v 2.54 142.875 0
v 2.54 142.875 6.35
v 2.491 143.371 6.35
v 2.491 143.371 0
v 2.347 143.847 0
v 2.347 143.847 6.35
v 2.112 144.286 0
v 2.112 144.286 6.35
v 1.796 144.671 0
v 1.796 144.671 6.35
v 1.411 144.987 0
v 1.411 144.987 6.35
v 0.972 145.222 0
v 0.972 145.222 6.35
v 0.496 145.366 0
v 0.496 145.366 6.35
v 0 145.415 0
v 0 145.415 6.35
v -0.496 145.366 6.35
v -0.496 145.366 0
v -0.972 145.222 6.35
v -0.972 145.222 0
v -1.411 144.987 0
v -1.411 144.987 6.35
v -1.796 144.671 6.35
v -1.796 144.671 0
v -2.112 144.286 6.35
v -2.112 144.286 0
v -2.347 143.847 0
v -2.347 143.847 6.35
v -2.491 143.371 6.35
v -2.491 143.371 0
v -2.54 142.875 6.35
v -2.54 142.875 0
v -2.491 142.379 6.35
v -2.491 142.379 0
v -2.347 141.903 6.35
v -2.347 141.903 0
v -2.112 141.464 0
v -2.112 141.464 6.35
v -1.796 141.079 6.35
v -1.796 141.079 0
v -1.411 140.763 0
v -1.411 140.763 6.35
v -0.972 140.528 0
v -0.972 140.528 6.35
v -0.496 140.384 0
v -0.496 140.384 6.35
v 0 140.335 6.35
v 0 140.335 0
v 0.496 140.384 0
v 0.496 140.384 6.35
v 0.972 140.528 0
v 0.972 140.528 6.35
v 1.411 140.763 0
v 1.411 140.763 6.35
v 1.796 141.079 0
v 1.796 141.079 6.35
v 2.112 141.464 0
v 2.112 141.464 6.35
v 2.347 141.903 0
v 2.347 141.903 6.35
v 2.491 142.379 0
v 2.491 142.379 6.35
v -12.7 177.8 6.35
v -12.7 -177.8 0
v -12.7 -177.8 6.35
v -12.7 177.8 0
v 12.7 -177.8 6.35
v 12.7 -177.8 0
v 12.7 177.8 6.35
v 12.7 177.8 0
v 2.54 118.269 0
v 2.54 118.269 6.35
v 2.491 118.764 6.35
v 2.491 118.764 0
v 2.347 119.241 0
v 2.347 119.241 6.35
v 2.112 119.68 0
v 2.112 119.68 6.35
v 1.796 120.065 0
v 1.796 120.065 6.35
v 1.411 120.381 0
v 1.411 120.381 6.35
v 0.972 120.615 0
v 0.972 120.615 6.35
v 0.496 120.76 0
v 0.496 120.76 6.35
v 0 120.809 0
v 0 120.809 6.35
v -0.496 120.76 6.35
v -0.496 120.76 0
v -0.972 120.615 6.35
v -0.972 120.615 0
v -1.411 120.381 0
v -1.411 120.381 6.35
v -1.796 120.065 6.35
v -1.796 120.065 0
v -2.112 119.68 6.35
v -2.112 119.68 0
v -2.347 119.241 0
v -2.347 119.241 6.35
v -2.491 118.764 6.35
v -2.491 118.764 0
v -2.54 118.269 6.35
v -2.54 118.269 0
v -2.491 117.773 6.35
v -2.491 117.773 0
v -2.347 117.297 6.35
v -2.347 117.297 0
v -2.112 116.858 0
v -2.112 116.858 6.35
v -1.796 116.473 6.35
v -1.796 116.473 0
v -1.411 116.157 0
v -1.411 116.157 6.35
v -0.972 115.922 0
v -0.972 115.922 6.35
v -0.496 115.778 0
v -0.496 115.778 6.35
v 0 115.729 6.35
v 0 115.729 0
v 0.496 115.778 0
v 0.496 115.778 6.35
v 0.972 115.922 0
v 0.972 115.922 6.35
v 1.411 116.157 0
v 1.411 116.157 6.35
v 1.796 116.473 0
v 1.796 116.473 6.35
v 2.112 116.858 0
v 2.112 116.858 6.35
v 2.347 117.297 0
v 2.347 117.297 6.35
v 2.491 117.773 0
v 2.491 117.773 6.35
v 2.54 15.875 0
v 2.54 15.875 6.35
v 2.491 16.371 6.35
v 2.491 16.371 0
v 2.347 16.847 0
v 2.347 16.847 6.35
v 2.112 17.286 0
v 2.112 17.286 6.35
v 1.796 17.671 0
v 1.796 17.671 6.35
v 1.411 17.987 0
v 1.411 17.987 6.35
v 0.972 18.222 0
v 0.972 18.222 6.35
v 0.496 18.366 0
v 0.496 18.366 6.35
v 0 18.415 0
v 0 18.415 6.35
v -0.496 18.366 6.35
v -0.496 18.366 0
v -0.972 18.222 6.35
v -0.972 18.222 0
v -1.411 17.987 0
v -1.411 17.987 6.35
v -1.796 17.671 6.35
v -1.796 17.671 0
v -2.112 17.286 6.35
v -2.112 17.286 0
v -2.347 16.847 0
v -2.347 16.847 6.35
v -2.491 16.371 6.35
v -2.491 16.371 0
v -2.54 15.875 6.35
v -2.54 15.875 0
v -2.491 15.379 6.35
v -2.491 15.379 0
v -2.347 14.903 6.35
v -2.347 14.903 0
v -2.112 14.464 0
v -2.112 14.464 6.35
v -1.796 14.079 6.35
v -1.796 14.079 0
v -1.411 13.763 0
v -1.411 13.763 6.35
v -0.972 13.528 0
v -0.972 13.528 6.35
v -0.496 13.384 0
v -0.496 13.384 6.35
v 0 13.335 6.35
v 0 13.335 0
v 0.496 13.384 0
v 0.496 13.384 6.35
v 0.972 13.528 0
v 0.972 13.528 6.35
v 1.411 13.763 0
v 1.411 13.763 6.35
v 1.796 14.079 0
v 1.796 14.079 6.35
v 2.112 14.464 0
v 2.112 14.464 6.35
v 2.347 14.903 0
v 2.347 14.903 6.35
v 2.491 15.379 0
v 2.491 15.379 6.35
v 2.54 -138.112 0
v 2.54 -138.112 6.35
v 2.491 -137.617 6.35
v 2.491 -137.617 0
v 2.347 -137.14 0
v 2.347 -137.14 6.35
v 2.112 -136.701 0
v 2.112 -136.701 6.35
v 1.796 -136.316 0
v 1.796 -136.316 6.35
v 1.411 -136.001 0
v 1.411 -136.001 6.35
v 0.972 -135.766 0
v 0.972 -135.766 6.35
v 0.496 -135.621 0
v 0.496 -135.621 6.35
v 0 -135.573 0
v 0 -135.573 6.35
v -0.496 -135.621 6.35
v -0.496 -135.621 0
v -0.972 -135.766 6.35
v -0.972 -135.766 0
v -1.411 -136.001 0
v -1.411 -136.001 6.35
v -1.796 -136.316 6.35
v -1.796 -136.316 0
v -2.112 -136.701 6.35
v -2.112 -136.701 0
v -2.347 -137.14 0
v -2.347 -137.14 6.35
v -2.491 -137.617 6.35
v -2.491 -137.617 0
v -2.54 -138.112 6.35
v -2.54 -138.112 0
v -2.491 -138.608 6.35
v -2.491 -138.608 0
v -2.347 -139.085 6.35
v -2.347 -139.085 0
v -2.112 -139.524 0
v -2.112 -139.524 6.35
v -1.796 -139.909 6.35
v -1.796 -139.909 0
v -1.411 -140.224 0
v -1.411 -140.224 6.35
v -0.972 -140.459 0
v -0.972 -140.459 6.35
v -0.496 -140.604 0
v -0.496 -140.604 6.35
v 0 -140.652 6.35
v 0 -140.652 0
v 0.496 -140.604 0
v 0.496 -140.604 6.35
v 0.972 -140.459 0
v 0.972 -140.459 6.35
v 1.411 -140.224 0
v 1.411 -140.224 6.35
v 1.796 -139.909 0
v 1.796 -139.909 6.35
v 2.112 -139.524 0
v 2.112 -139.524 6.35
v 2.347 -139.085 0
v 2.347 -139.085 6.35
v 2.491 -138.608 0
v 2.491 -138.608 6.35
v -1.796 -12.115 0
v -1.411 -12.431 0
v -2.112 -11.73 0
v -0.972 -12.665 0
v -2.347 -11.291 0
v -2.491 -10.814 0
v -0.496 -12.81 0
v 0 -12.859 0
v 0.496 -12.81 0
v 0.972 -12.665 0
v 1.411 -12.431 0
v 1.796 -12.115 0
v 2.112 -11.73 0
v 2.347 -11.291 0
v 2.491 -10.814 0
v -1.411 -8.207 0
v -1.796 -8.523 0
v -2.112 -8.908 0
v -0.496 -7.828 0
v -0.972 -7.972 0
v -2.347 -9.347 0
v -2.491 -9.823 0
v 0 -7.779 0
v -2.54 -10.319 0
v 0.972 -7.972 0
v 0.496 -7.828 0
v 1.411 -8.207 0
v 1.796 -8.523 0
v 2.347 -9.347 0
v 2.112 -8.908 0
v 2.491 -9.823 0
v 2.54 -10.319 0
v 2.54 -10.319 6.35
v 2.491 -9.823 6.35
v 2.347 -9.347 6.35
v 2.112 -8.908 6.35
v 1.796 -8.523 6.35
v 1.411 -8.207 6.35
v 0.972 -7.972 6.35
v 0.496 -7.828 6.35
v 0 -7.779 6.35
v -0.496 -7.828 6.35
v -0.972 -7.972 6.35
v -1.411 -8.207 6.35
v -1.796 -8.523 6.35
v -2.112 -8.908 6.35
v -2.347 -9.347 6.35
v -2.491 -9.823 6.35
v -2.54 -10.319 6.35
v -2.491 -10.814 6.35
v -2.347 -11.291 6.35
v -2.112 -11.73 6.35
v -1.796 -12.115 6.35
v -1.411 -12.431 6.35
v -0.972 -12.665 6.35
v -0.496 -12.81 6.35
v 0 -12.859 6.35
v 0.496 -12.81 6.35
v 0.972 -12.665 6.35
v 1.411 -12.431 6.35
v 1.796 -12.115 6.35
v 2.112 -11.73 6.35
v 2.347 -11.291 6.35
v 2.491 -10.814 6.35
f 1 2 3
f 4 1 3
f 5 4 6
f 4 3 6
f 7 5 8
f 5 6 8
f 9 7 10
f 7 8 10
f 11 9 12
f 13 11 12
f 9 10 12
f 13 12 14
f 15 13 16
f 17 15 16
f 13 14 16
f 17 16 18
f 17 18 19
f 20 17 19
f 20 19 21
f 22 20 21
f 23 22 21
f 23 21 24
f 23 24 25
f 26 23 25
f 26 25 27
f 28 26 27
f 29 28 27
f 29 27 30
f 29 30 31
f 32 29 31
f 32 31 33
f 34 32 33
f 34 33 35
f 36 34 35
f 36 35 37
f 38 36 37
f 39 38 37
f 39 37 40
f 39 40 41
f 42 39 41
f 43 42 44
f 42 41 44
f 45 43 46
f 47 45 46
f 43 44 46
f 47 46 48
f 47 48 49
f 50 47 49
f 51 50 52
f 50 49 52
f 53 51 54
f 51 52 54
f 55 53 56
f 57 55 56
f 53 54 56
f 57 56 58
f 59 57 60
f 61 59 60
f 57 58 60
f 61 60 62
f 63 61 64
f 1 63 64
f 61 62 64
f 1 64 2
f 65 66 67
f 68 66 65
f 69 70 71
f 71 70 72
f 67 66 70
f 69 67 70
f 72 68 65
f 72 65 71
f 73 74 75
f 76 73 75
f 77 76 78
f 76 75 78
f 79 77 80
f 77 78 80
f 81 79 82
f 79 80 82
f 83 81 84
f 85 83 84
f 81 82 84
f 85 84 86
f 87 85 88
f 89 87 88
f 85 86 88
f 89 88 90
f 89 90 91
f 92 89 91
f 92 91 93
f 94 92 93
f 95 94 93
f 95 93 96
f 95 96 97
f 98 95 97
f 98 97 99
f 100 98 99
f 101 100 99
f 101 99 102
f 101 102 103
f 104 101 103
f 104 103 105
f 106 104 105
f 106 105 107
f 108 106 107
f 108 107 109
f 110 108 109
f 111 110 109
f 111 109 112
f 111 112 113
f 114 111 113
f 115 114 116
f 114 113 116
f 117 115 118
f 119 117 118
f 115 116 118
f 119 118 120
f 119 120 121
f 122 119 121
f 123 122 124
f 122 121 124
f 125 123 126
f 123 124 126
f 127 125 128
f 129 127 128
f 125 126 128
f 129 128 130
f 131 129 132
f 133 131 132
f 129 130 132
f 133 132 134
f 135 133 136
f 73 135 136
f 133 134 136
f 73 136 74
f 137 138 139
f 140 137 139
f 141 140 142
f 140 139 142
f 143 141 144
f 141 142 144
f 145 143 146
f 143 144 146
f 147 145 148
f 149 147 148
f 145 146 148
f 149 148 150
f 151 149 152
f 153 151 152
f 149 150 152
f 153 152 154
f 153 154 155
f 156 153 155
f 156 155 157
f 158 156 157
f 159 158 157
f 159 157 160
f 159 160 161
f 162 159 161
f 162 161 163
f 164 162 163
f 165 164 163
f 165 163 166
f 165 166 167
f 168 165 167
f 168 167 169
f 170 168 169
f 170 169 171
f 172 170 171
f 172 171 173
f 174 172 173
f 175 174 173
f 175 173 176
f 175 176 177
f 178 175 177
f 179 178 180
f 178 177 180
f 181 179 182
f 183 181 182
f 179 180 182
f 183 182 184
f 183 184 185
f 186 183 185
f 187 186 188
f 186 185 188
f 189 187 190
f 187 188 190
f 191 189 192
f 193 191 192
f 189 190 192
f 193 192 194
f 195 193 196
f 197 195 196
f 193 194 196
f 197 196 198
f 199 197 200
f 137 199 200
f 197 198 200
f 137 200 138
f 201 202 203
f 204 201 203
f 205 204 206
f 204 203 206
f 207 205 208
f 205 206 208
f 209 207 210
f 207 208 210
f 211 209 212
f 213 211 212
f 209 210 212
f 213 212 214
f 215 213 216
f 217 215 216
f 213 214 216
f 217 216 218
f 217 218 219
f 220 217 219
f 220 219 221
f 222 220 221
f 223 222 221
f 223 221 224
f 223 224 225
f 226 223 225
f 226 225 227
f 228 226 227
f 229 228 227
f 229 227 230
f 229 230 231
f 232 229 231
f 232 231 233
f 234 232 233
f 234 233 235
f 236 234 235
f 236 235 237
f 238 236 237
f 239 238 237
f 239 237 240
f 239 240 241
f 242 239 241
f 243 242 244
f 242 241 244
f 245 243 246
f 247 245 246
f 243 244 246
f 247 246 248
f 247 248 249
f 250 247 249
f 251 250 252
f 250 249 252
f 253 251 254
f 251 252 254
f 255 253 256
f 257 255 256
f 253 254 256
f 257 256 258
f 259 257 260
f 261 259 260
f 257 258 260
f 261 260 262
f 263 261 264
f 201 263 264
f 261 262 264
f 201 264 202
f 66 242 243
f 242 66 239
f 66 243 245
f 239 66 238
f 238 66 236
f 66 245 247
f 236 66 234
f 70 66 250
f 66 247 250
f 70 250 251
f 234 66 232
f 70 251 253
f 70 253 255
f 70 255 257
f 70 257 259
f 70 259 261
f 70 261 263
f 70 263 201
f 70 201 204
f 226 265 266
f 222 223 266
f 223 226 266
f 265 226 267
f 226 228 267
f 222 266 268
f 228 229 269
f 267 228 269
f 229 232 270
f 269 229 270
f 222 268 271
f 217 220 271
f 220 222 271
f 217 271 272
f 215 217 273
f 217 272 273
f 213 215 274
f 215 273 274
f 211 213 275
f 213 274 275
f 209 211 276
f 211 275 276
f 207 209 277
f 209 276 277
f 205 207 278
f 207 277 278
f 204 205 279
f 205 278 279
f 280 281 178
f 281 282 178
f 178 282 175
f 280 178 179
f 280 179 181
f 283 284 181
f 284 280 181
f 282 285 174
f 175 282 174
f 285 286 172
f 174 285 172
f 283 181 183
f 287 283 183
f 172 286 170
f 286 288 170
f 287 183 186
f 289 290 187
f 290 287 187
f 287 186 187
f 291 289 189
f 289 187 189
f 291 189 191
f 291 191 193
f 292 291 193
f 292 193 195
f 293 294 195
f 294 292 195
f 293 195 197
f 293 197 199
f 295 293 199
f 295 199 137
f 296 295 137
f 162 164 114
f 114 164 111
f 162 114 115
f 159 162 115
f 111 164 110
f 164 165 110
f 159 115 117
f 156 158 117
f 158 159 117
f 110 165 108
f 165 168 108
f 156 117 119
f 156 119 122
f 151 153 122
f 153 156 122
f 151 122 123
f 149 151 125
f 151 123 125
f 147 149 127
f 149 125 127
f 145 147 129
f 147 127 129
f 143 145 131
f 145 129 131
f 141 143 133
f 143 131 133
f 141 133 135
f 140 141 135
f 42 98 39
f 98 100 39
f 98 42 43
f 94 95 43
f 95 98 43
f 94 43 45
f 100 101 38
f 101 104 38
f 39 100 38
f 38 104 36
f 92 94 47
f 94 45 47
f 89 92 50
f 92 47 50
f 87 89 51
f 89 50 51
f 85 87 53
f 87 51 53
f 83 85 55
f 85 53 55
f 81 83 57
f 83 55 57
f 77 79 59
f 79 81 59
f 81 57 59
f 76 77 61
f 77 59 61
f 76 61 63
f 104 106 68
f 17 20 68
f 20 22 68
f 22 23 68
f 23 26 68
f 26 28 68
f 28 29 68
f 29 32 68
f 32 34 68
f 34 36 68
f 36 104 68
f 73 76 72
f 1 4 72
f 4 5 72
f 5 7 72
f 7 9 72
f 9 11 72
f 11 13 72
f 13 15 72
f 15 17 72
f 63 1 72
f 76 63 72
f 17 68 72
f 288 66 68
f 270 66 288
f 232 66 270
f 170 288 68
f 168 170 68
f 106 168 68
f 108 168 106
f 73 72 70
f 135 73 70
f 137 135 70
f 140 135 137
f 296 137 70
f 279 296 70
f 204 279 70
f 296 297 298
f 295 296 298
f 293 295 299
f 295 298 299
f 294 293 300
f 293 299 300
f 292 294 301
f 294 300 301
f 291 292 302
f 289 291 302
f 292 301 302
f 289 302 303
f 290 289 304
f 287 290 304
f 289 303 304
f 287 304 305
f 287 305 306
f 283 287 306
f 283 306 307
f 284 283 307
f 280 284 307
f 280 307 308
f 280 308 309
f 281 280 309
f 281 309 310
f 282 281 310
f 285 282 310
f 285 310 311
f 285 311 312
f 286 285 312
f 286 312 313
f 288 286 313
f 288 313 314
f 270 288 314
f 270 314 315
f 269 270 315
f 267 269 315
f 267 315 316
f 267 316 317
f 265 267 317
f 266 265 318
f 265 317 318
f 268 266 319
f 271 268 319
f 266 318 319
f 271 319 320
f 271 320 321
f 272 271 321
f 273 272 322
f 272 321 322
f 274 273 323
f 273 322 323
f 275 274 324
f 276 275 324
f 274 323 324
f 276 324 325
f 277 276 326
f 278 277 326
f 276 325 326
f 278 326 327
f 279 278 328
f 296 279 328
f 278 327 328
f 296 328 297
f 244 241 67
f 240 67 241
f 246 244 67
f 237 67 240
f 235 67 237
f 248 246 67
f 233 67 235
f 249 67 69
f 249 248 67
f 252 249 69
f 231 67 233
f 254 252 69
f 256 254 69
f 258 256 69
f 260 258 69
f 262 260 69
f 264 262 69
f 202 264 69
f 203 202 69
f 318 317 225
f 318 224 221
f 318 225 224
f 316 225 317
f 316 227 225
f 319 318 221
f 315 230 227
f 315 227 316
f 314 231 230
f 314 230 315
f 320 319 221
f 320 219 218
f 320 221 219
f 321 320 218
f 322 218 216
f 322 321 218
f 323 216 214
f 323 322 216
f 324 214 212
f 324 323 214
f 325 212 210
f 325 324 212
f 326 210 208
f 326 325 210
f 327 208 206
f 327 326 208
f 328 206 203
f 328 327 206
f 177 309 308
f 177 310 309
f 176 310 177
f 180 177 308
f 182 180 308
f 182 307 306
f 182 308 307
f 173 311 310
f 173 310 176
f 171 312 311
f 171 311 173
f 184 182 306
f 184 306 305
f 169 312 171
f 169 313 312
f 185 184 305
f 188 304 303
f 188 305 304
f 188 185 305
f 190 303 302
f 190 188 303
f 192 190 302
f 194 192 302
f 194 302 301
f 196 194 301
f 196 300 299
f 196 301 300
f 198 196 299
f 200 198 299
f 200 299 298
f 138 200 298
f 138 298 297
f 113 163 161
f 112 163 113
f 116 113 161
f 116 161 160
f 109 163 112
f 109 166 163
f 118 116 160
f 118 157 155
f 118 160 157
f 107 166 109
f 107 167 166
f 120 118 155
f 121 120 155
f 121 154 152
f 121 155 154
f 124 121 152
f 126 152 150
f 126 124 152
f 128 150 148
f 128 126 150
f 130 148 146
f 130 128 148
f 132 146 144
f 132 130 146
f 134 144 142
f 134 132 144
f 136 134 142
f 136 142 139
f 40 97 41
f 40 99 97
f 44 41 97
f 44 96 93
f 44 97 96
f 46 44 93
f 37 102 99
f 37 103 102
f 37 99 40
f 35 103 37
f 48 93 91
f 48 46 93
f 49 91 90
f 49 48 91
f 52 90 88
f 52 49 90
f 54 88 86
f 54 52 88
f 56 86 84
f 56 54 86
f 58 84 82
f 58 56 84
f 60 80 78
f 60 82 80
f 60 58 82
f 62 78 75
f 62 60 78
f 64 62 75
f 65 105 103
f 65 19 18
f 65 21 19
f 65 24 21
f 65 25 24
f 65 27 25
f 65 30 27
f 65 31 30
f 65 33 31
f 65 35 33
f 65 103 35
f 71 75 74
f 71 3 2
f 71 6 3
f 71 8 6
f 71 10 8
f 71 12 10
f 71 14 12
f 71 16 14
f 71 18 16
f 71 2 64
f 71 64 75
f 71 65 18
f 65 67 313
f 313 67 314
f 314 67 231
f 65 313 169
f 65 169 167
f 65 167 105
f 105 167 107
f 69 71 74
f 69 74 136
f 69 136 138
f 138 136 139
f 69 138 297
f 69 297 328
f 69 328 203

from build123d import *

# Parameters (mm, degrees)
SKETCH1_W           = 25.4
SKETCH1_H           = 355.6
BOSS_EXTRUDE1_DEPTH = 6.35
SKETCH2_R           = 2.54
CUT_EXTRUDE1_DEPTH  = 7.35


with BuildPart() as part:
    # Sketch1 → Boss-Extrude1 (new body)
    with BuildSketch(Plane.XY):
        Rectangle(SKETCH1_W, SKETCH1_H)
    extrude(amount=BOSS_EXTRUDE1_DEPTH)

    # Sketch2 → Cut-Extrude1 (cut, through all)
    with BuildSketch(Plane.XY.offset(6.35)):
        with Locations((0, 142.875)):
            Circle(SKETCH2_R)
        with Locations((0, 118.26875)):
            Circle(SKETCH2_R)
        with Locations((0, 15.875)):
            Circle(SKETCH2_R)
        with Locations((0, -10.31875)):
            Circle(SKETCH2_R)
        with Locations((0, -138.1125)):
            Circle(SKETCH2_R)
    extrude(amount=-CUT_EXTRUDE1_DEPTH, mode=Mode.SUBTRACT)


solid = part.part
